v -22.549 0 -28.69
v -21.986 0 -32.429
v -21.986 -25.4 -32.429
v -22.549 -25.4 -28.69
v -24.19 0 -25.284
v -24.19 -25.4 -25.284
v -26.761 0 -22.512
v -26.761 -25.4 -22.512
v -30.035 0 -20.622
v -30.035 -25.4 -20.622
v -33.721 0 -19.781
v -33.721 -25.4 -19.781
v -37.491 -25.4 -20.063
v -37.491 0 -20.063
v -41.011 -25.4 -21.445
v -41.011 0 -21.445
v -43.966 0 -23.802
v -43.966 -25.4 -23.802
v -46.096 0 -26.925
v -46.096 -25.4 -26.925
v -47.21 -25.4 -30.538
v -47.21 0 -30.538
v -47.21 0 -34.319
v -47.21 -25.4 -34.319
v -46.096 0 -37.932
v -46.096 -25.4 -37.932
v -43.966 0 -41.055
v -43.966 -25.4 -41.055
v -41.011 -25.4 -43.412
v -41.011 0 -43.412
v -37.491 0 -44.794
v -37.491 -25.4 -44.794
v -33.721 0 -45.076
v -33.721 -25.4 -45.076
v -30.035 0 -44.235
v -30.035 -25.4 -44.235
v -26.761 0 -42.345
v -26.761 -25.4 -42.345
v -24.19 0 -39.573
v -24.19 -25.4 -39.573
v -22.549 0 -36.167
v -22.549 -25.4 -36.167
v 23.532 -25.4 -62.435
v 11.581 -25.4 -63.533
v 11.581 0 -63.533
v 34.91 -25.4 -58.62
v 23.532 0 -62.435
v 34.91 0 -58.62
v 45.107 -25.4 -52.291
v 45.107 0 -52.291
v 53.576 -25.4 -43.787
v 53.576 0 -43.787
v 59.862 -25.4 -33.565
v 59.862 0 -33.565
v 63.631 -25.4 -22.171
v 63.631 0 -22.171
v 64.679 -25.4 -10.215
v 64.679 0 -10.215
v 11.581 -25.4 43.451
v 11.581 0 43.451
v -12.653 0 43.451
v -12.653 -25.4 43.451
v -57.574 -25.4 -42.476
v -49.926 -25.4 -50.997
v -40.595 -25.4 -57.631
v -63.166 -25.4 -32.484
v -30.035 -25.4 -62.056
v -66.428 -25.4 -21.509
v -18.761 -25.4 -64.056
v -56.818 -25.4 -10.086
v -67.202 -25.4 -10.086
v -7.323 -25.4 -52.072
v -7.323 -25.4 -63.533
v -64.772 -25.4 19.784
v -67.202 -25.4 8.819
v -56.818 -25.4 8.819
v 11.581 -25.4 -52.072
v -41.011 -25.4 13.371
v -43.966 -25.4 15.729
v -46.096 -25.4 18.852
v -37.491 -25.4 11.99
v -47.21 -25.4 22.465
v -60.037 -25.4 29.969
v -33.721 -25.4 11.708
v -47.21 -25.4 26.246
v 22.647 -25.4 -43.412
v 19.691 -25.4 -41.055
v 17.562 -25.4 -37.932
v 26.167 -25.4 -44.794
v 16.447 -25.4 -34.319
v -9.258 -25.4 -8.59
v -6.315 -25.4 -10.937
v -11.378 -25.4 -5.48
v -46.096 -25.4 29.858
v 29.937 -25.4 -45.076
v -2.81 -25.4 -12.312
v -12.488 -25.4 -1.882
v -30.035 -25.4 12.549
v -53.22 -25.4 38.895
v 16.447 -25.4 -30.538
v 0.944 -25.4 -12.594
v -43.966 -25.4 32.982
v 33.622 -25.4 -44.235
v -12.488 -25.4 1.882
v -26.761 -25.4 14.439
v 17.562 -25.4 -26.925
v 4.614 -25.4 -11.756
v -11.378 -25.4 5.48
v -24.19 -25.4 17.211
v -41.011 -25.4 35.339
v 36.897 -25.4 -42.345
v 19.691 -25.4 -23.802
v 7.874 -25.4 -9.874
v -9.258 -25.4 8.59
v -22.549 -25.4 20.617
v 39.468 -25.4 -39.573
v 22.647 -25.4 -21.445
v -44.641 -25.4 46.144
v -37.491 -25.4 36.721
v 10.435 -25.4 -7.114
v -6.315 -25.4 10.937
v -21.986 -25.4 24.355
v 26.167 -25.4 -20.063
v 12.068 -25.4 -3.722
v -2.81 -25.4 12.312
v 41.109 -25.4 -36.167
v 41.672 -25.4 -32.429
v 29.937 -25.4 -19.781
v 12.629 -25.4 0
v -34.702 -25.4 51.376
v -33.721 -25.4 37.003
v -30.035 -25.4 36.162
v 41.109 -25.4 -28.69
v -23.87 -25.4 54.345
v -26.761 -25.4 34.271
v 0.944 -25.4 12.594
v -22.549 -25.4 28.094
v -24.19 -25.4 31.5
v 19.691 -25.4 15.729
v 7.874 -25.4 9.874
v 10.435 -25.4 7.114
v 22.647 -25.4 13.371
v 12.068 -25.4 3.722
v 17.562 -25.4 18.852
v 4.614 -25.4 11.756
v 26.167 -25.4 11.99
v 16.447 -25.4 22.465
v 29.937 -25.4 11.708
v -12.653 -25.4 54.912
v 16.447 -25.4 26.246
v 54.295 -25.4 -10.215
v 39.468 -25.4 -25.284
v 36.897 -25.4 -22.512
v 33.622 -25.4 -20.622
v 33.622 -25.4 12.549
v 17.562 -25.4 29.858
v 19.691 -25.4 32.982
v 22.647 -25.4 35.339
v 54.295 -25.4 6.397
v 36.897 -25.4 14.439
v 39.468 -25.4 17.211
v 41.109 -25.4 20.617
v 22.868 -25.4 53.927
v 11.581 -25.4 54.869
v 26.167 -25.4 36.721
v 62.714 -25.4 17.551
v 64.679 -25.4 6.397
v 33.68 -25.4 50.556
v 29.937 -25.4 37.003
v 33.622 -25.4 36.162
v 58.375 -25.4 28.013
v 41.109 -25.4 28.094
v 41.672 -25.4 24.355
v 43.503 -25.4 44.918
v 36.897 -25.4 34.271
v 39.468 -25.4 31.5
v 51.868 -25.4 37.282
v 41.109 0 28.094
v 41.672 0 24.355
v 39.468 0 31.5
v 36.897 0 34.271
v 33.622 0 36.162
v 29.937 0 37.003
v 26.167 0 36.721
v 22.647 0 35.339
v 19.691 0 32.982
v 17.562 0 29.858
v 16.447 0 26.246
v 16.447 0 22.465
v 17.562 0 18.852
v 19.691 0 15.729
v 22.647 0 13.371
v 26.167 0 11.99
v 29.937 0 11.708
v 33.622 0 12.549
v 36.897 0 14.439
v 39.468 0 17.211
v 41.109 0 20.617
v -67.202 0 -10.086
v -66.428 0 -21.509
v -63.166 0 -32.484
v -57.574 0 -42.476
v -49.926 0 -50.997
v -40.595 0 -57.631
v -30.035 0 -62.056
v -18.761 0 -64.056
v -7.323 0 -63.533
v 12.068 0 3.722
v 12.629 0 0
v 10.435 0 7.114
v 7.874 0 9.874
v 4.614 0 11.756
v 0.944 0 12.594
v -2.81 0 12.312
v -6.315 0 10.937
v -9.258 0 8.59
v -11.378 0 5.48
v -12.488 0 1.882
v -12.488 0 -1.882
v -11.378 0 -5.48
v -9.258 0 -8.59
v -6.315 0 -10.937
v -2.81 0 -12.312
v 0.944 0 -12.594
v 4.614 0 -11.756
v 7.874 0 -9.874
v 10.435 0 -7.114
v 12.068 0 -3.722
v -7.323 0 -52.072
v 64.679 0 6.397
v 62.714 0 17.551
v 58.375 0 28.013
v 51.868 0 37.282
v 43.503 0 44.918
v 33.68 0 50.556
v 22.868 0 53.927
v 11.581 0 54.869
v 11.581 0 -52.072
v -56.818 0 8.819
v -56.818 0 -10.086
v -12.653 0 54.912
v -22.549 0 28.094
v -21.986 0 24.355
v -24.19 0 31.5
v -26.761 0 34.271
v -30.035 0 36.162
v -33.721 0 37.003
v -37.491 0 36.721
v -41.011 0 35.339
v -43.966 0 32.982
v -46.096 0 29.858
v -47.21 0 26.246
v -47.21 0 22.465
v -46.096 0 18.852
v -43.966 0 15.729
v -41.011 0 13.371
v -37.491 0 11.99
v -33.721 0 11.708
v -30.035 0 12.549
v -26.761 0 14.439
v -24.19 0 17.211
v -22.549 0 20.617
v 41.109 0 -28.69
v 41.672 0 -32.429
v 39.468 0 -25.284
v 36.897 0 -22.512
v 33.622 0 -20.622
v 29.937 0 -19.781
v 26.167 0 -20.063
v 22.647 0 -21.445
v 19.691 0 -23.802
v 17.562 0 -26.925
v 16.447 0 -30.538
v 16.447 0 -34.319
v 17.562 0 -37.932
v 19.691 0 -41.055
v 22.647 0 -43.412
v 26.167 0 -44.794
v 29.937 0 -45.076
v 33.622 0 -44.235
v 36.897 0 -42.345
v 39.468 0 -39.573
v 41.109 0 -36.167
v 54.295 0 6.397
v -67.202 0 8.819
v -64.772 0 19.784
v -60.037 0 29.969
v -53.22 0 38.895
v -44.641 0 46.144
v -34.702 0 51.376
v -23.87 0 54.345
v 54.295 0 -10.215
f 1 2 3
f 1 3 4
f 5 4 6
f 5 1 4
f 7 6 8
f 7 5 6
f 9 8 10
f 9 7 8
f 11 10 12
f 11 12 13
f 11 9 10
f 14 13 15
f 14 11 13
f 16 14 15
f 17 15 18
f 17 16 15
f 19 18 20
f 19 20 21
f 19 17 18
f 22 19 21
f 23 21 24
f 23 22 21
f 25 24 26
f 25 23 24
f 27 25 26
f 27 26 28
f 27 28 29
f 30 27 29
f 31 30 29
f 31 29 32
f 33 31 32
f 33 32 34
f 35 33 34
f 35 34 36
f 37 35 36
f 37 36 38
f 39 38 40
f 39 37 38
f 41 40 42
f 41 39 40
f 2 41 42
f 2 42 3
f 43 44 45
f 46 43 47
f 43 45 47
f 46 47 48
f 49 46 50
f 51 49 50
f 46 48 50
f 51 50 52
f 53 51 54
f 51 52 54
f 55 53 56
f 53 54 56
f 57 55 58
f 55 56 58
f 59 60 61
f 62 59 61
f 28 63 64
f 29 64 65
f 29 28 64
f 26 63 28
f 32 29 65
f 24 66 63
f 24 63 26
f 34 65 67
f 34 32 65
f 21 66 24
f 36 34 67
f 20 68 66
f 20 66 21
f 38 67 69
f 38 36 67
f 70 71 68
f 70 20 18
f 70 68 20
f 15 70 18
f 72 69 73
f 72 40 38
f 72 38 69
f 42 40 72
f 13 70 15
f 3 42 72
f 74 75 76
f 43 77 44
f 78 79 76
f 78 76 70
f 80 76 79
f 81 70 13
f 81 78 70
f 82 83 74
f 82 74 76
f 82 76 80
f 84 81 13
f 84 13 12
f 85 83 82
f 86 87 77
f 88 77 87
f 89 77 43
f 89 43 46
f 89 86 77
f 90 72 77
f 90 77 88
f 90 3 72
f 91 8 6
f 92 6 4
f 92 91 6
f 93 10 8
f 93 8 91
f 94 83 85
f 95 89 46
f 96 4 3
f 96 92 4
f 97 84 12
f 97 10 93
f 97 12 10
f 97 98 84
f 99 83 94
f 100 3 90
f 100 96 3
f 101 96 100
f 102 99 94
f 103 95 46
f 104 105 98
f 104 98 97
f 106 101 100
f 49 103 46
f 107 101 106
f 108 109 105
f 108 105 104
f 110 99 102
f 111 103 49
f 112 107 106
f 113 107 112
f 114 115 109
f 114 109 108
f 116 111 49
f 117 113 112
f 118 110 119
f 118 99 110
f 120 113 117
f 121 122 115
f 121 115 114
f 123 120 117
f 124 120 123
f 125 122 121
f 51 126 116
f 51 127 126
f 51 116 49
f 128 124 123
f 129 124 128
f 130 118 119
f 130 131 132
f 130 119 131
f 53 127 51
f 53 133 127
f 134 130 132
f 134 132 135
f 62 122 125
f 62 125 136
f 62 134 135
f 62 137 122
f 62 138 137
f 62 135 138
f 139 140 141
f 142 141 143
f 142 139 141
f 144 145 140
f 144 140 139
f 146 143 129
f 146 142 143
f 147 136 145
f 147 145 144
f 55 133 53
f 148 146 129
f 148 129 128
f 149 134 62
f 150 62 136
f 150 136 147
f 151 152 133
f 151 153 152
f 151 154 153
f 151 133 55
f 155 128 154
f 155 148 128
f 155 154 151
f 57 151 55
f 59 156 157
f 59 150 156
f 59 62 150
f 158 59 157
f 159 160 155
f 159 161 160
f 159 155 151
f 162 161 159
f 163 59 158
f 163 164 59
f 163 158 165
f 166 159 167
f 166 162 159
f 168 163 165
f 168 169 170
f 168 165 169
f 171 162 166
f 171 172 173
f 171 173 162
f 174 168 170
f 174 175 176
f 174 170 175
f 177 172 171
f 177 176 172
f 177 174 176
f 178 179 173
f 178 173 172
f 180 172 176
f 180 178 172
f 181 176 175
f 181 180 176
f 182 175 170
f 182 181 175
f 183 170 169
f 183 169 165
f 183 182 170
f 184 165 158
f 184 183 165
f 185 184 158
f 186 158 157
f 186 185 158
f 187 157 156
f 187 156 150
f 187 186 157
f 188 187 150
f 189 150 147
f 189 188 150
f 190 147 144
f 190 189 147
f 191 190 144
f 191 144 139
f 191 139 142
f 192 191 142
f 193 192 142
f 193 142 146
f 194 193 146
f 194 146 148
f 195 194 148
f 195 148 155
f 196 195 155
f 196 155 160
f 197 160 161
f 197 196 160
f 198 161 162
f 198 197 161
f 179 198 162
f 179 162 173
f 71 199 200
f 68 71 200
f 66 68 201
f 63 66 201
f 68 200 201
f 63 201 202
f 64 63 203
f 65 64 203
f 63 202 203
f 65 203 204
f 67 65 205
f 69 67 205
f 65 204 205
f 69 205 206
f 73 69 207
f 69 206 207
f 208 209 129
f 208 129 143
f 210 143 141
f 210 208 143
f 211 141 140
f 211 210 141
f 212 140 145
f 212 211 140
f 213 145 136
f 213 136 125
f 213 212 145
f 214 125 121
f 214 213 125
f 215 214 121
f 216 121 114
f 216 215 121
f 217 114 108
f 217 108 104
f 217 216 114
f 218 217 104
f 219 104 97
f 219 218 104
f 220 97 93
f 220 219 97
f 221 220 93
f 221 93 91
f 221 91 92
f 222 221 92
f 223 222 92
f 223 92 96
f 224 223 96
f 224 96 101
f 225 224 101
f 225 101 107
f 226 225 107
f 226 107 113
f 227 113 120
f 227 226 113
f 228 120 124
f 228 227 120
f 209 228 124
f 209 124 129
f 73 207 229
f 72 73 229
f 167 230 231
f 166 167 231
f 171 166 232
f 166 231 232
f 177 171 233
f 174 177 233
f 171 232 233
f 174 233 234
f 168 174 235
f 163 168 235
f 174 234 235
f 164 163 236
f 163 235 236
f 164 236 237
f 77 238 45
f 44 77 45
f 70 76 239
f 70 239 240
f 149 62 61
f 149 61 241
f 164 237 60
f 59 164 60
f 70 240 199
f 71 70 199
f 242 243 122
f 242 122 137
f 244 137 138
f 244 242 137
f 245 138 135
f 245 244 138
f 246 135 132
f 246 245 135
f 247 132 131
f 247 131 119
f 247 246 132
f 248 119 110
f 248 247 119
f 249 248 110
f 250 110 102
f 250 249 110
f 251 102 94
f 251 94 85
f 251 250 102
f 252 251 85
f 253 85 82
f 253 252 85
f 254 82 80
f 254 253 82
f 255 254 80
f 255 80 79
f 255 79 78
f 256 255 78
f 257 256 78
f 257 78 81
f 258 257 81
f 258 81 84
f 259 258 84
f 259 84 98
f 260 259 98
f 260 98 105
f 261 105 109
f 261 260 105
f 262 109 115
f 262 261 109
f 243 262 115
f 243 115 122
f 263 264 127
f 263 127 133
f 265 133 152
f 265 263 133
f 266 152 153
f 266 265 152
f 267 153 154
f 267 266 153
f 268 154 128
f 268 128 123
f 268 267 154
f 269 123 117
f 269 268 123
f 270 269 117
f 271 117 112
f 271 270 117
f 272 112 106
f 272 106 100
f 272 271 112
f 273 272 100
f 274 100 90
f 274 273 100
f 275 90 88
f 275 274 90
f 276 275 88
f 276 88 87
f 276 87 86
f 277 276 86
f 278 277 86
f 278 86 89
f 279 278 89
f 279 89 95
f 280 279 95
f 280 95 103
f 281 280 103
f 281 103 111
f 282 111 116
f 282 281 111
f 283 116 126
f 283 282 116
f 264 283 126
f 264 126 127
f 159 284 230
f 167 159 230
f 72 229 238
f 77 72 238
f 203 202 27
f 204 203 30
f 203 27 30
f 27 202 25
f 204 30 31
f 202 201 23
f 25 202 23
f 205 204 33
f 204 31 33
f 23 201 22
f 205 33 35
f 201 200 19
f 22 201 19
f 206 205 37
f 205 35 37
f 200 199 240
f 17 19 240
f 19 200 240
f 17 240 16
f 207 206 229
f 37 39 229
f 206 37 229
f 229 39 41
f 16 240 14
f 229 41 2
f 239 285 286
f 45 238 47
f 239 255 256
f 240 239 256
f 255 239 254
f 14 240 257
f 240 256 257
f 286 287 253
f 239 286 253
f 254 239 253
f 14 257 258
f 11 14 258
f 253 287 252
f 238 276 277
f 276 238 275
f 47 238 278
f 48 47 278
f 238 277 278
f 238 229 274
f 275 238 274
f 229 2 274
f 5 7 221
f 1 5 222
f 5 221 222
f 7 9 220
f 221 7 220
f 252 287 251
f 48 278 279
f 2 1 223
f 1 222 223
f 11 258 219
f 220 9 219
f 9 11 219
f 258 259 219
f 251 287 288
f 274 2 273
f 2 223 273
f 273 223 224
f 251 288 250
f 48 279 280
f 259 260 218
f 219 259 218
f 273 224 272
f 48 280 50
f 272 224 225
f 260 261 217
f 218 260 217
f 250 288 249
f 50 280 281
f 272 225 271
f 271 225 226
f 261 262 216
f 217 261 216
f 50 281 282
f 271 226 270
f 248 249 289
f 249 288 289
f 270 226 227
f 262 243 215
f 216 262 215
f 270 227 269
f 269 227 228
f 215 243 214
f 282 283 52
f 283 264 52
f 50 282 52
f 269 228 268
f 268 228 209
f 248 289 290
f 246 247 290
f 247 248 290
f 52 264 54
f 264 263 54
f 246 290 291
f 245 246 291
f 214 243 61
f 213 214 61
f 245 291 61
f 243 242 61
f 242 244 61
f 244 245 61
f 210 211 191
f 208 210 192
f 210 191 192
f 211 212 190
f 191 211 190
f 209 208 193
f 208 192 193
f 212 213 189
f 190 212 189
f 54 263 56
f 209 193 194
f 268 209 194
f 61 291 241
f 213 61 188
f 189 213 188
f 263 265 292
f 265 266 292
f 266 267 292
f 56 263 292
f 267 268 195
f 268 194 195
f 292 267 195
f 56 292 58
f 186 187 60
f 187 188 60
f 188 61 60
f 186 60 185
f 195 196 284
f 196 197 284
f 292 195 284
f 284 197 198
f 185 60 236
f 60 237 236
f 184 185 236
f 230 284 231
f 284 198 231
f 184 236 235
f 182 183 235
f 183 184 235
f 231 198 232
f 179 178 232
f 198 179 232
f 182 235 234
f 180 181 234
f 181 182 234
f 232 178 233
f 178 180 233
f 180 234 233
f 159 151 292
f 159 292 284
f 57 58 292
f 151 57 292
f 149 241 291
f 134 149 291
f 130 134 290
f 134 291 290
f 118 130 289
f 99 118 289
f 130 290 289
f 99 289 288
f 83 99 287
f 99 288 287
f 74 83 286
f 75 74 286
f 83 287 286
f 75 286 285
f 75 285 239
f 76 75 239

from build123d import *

# Parameters (mm, degrees)
F0_R     = 12.683185
F0_R_2   = 12.629116
F1_DEPTH = 25.4


with BuildPart() as f1:
    # F0 (on Front) → F1 (new body)
    with BuildSketch(Plane.XZ):
        with BuildLine():
            Line((54.29461, -10.215261), (54.29461, 6.396934))
            Line((54.29461, 6.396934), (64.678587, 6.396934))
            ThreePointArc((64.678587, 6.396934), (47.894565, 41.329487), (11.581181, 54.869236))
            Line((11.581181, 54.869236), (11.581181, 43.450589))
            Line((11.581181, 43.450589), (-12.652815, 43.450589))
            Line((-12.652815, 43.450589), (-12.652815, 54.911602))
            ThreePointArc((-12.652815, 54.911602), (-49.127425, 42.752813), (-67.202314, 8.818588))
            Line((-67.202314, 8.818588), (-56.818337, 8.818588))
            Line((-56.818337, 8.818588), (-56.818337, -10.085616))
            Line((-56.818337, -10.085616), (-67.202314, -10.085616))
            ThreePointArc((-67.202314, -10.085616), (-49.926198, -50.996741), (-7.323014, -63.532812))
            Line((-7.323014, -63.532812), (-7.323014, -52.071802))
            Line((-7.323014, -52.071802), (11.581181, -52.071802))
            Line((11.581181, -52.071802), (11.581181, -63.532812))
            ThreePointArc((11.581181, -63.532812), (49.58814, -48.284983), (64.678587, -10.215261))
            Line((64.678587, -10.215261), (54.29461, -10.215261))
        make_face()
        with Locations((-34.668908, -32.428525)):
            Circle(F0_R, mode=Mode.SUBTRACT)
        with Locations((28.988812, -32.428525)):
            Circle(F0_R, mode=Mode.SUBTRACT)
        with Locations((-34.668908, 24.355358)):
            Circle(F0_R, mode=Mode.SUBTRACT)
        Circle(F0_R_2, mode=Mode.SUBTRACT)
        with Locations((28.988812, 24.355358)):
            Circle(F0_R, mode=Mode.SUBTRACT)
    extrude(amount=F1_DEPTH)


solid = f1.part
